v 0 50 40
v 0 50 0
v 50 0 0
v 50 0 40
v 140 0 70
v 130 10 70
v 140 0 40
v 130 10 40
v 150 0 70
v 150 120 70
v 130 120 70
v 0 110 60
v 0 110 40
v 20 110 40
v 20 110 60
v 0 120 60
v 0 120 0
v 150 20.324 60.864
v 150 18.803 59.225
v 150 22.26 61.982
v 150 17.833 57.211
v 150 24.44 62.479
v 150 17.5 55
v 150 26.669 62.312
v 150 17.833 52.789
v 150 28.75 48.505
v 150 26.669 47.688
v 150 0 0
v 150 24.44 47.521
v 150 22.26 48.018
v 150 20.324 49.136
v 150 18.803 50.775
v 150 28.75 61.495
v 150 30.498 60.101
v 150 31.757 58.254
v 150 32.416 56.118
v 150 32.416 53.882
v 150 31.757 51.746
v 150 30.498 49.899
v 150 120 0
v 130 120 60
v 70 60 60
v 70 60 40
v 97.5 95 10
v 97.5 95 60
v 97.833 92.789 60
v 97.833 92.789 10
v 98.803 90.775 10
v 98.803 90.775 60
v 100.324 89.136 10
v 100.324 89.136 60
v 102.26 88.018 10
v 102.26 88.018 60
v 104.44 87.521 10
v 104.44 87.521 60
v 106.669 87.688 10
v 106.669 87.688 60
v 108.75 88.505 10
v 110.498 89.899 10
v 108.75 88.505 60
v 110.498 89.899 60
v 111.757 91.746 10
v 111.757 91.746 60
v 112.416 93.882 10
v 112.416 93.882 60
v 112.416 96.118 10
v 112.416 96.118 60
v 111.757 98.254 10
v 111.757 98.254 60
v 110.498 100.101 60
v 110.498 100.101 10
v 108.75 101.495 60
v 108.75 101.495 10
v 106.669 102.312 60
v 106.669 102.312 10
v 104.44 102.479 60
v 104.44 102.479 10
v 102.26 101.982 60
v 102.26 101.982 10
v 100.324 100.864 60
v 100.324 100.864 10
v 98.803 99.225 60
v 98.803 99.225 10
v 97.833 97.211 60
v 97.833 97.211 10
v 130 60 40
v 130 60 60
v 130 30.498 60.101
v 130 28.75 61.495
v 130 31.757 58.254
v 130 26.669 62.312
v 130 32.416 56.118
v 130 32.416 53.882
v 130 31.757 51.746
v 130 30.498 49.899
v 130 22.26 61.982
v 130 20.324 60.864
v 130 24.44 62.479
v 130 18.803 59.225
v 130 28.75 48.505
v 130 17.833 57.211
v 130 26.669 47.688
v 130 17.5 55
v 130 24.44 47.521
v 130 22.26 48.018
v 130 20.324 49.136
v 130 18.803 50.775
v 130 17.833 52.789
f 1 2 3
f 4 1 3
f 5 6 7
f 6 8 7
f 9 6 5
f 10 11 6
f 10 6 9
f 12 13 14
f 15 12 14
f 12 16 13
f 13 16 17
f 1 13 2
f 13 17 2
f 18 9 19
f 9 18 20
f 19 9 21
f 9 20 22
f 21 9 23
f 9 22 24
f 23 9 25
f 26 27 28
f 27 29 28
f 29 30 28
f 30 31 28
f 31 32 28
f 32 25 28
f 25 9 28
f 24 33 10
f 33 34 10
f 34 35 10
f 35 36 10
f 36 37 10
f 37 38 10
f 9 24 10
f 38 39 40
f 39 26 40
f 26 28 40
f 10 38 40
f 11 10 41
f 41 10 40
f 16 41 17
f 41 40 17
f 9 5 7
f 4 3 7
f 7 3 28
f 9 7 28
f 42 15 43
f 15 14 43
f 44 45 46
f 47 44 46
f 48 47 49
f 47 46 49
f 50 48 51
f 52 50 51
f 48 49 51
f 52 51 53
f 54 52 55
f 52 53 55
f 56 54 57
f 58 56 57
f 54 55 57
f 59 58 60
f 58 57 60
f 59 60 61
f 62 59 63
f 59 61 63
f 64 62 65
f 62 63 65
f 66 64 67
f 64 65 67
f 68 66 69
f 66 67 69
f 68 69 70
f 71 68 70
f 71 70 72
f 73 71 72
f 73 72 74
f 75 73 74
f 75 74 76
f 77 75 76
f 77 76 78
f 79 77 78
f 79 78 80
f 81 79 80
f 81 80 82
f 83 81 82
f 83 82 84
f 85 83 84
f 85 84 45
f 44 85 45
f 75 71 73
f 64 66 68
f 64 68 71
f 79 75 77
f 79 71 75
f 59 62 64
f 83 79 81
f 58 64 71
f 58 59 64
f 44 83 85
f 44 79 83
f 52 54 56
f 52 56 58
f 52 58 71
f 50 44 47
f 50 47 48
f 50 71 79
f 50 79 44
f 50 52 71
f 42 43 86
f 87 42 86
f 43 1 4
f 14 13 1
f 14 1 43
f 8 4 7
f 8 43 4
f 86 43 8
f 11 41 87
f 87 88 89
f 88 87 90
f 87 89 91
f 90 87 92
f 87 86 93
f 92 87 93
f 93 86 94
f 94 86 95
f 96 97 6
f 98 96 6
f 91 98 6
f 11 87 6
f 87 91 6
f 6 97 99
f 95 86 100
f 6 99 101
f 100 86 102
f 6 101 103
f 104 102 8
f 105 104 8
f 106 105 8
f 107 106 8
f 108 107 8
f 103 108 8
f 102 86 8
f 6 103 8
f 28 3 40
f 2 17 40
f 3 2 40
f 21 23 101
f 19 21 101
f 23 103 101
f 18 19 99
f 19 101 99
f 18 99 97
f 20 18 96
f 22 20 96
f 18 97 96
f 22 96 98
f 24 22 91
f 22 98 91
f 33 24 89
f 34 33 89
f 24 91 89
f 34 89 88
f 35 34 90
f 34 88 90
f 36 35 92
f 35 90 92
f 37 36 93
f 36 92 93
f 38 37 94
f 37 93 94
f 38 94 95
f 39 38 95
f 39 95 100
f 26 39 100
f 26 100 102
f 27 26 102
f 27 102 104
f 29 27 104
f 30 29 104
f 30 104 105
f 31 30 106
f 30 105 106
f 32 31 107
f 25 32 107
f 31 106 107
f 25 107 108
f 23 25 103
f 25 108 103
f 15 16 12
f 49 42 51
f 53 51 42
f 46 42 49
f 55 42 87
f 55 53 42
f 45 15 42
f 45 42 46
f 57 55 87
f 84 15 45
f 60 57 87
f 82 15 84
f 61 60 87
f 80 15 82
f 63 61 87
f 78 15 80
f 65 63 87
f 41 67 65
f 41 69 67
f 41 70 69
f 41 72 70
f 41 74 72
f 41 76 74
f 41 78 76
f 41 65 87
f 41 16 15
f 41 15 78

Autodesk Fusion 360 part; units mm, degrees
sketch "Sketch1" plane through (0, 0, 0) normal (0, 0, 1) x (1, 0, 0)
  line L0 (50, 0) -> (150, 0)
  line L1 (150, 0) -> (150, 120)
  line L2 (150, 120) -> (0, 120)
  line L3 (0, 120) -> (0, 50)
  line L4 (0, 50) -> (50, 0)
  line L5 (0, 50) -> (0, 0)
  line L6 (0, 0) -> (50, 0)
  line L7 (0, 110) -> (20, 110)
  line L8 (20, 110) -> (70, 60)
  line L9 (70, 60) -> (130, 60)
  line L10 (130, 60) -> (130, 120)
  line L11 (130, 60) -> (130, 10)
  line L12 (130, 10) -> (140, 0)
  dimension "d2" = 120
  dimension "d3" = 50
  dimension "d4" = 135
  dimension "d5" = 10
  dimension "d6" = 10
  dimension "d7" = 10
  dimension "d8" = 60
  dimension "d9" = 135
  dimension "d10" = 20
  dimension "d17" = 60
extrude "Extrude1" add sketch "Sketch1" along normal blind 40 contours L0 L3 L4 L7 L8 L9 L11 L12
extrude "Extrude2" add sketch "Sketch1" along normal blind 60 contours L2 L3 L7 L8 L9 L10
extrude "Extrude3" add sketch "Sketch1" along normal blind 70 contours L0 L1 L2 L10 L11 L12
sketch "Sketch2" plane through (0, 0, 60) normal (0, 0, 1) x (-1, 0, 0)
  line L0 (-130, -60) -> (-130, -120)
  line L1 (-130, -120) -> (0, -120)
  line L2 (0, -120) -> (0, -110)
  line L3 (0, -110) -> (-20, -110)
  line L4 (-20, -110) -> (-70, -60)
  line L5 (-70, -60) -> (-130, -60)
  circle A0 centre (-105, -95) radius 7.5
  dimension "d23" = 15
  dimension "d24" = 25
  dimension "d25" = 25
sketch "Sketch3" plane through (130, 0, 0) normal (-1, 0, 0) x (0, -1, 0)
  line L0 (-60, 40) -> (-10, 40)
  line L1 (-10, 40) -> (-10, 70)
  line L2 (-10, 70) -> (-120, 70)
  line L3 (-60, 60) -> (-60, 40)
  circle A0 centre (-25, 55) radius 7.5
  line L4 (-120, 70) -> (-120, 60)
  line L5 (-120, 60) -> (-60, 60)
  dimension "d26" = 15
  dimension "d27" = 15
  dimension "d28" = 15
extrude "Extrude4" cut sketch "Sketch3" against normal blind 30 contours A0
extrude "Extrude5" cut sketch "Sketch2" against normal blind 50 contours A0
